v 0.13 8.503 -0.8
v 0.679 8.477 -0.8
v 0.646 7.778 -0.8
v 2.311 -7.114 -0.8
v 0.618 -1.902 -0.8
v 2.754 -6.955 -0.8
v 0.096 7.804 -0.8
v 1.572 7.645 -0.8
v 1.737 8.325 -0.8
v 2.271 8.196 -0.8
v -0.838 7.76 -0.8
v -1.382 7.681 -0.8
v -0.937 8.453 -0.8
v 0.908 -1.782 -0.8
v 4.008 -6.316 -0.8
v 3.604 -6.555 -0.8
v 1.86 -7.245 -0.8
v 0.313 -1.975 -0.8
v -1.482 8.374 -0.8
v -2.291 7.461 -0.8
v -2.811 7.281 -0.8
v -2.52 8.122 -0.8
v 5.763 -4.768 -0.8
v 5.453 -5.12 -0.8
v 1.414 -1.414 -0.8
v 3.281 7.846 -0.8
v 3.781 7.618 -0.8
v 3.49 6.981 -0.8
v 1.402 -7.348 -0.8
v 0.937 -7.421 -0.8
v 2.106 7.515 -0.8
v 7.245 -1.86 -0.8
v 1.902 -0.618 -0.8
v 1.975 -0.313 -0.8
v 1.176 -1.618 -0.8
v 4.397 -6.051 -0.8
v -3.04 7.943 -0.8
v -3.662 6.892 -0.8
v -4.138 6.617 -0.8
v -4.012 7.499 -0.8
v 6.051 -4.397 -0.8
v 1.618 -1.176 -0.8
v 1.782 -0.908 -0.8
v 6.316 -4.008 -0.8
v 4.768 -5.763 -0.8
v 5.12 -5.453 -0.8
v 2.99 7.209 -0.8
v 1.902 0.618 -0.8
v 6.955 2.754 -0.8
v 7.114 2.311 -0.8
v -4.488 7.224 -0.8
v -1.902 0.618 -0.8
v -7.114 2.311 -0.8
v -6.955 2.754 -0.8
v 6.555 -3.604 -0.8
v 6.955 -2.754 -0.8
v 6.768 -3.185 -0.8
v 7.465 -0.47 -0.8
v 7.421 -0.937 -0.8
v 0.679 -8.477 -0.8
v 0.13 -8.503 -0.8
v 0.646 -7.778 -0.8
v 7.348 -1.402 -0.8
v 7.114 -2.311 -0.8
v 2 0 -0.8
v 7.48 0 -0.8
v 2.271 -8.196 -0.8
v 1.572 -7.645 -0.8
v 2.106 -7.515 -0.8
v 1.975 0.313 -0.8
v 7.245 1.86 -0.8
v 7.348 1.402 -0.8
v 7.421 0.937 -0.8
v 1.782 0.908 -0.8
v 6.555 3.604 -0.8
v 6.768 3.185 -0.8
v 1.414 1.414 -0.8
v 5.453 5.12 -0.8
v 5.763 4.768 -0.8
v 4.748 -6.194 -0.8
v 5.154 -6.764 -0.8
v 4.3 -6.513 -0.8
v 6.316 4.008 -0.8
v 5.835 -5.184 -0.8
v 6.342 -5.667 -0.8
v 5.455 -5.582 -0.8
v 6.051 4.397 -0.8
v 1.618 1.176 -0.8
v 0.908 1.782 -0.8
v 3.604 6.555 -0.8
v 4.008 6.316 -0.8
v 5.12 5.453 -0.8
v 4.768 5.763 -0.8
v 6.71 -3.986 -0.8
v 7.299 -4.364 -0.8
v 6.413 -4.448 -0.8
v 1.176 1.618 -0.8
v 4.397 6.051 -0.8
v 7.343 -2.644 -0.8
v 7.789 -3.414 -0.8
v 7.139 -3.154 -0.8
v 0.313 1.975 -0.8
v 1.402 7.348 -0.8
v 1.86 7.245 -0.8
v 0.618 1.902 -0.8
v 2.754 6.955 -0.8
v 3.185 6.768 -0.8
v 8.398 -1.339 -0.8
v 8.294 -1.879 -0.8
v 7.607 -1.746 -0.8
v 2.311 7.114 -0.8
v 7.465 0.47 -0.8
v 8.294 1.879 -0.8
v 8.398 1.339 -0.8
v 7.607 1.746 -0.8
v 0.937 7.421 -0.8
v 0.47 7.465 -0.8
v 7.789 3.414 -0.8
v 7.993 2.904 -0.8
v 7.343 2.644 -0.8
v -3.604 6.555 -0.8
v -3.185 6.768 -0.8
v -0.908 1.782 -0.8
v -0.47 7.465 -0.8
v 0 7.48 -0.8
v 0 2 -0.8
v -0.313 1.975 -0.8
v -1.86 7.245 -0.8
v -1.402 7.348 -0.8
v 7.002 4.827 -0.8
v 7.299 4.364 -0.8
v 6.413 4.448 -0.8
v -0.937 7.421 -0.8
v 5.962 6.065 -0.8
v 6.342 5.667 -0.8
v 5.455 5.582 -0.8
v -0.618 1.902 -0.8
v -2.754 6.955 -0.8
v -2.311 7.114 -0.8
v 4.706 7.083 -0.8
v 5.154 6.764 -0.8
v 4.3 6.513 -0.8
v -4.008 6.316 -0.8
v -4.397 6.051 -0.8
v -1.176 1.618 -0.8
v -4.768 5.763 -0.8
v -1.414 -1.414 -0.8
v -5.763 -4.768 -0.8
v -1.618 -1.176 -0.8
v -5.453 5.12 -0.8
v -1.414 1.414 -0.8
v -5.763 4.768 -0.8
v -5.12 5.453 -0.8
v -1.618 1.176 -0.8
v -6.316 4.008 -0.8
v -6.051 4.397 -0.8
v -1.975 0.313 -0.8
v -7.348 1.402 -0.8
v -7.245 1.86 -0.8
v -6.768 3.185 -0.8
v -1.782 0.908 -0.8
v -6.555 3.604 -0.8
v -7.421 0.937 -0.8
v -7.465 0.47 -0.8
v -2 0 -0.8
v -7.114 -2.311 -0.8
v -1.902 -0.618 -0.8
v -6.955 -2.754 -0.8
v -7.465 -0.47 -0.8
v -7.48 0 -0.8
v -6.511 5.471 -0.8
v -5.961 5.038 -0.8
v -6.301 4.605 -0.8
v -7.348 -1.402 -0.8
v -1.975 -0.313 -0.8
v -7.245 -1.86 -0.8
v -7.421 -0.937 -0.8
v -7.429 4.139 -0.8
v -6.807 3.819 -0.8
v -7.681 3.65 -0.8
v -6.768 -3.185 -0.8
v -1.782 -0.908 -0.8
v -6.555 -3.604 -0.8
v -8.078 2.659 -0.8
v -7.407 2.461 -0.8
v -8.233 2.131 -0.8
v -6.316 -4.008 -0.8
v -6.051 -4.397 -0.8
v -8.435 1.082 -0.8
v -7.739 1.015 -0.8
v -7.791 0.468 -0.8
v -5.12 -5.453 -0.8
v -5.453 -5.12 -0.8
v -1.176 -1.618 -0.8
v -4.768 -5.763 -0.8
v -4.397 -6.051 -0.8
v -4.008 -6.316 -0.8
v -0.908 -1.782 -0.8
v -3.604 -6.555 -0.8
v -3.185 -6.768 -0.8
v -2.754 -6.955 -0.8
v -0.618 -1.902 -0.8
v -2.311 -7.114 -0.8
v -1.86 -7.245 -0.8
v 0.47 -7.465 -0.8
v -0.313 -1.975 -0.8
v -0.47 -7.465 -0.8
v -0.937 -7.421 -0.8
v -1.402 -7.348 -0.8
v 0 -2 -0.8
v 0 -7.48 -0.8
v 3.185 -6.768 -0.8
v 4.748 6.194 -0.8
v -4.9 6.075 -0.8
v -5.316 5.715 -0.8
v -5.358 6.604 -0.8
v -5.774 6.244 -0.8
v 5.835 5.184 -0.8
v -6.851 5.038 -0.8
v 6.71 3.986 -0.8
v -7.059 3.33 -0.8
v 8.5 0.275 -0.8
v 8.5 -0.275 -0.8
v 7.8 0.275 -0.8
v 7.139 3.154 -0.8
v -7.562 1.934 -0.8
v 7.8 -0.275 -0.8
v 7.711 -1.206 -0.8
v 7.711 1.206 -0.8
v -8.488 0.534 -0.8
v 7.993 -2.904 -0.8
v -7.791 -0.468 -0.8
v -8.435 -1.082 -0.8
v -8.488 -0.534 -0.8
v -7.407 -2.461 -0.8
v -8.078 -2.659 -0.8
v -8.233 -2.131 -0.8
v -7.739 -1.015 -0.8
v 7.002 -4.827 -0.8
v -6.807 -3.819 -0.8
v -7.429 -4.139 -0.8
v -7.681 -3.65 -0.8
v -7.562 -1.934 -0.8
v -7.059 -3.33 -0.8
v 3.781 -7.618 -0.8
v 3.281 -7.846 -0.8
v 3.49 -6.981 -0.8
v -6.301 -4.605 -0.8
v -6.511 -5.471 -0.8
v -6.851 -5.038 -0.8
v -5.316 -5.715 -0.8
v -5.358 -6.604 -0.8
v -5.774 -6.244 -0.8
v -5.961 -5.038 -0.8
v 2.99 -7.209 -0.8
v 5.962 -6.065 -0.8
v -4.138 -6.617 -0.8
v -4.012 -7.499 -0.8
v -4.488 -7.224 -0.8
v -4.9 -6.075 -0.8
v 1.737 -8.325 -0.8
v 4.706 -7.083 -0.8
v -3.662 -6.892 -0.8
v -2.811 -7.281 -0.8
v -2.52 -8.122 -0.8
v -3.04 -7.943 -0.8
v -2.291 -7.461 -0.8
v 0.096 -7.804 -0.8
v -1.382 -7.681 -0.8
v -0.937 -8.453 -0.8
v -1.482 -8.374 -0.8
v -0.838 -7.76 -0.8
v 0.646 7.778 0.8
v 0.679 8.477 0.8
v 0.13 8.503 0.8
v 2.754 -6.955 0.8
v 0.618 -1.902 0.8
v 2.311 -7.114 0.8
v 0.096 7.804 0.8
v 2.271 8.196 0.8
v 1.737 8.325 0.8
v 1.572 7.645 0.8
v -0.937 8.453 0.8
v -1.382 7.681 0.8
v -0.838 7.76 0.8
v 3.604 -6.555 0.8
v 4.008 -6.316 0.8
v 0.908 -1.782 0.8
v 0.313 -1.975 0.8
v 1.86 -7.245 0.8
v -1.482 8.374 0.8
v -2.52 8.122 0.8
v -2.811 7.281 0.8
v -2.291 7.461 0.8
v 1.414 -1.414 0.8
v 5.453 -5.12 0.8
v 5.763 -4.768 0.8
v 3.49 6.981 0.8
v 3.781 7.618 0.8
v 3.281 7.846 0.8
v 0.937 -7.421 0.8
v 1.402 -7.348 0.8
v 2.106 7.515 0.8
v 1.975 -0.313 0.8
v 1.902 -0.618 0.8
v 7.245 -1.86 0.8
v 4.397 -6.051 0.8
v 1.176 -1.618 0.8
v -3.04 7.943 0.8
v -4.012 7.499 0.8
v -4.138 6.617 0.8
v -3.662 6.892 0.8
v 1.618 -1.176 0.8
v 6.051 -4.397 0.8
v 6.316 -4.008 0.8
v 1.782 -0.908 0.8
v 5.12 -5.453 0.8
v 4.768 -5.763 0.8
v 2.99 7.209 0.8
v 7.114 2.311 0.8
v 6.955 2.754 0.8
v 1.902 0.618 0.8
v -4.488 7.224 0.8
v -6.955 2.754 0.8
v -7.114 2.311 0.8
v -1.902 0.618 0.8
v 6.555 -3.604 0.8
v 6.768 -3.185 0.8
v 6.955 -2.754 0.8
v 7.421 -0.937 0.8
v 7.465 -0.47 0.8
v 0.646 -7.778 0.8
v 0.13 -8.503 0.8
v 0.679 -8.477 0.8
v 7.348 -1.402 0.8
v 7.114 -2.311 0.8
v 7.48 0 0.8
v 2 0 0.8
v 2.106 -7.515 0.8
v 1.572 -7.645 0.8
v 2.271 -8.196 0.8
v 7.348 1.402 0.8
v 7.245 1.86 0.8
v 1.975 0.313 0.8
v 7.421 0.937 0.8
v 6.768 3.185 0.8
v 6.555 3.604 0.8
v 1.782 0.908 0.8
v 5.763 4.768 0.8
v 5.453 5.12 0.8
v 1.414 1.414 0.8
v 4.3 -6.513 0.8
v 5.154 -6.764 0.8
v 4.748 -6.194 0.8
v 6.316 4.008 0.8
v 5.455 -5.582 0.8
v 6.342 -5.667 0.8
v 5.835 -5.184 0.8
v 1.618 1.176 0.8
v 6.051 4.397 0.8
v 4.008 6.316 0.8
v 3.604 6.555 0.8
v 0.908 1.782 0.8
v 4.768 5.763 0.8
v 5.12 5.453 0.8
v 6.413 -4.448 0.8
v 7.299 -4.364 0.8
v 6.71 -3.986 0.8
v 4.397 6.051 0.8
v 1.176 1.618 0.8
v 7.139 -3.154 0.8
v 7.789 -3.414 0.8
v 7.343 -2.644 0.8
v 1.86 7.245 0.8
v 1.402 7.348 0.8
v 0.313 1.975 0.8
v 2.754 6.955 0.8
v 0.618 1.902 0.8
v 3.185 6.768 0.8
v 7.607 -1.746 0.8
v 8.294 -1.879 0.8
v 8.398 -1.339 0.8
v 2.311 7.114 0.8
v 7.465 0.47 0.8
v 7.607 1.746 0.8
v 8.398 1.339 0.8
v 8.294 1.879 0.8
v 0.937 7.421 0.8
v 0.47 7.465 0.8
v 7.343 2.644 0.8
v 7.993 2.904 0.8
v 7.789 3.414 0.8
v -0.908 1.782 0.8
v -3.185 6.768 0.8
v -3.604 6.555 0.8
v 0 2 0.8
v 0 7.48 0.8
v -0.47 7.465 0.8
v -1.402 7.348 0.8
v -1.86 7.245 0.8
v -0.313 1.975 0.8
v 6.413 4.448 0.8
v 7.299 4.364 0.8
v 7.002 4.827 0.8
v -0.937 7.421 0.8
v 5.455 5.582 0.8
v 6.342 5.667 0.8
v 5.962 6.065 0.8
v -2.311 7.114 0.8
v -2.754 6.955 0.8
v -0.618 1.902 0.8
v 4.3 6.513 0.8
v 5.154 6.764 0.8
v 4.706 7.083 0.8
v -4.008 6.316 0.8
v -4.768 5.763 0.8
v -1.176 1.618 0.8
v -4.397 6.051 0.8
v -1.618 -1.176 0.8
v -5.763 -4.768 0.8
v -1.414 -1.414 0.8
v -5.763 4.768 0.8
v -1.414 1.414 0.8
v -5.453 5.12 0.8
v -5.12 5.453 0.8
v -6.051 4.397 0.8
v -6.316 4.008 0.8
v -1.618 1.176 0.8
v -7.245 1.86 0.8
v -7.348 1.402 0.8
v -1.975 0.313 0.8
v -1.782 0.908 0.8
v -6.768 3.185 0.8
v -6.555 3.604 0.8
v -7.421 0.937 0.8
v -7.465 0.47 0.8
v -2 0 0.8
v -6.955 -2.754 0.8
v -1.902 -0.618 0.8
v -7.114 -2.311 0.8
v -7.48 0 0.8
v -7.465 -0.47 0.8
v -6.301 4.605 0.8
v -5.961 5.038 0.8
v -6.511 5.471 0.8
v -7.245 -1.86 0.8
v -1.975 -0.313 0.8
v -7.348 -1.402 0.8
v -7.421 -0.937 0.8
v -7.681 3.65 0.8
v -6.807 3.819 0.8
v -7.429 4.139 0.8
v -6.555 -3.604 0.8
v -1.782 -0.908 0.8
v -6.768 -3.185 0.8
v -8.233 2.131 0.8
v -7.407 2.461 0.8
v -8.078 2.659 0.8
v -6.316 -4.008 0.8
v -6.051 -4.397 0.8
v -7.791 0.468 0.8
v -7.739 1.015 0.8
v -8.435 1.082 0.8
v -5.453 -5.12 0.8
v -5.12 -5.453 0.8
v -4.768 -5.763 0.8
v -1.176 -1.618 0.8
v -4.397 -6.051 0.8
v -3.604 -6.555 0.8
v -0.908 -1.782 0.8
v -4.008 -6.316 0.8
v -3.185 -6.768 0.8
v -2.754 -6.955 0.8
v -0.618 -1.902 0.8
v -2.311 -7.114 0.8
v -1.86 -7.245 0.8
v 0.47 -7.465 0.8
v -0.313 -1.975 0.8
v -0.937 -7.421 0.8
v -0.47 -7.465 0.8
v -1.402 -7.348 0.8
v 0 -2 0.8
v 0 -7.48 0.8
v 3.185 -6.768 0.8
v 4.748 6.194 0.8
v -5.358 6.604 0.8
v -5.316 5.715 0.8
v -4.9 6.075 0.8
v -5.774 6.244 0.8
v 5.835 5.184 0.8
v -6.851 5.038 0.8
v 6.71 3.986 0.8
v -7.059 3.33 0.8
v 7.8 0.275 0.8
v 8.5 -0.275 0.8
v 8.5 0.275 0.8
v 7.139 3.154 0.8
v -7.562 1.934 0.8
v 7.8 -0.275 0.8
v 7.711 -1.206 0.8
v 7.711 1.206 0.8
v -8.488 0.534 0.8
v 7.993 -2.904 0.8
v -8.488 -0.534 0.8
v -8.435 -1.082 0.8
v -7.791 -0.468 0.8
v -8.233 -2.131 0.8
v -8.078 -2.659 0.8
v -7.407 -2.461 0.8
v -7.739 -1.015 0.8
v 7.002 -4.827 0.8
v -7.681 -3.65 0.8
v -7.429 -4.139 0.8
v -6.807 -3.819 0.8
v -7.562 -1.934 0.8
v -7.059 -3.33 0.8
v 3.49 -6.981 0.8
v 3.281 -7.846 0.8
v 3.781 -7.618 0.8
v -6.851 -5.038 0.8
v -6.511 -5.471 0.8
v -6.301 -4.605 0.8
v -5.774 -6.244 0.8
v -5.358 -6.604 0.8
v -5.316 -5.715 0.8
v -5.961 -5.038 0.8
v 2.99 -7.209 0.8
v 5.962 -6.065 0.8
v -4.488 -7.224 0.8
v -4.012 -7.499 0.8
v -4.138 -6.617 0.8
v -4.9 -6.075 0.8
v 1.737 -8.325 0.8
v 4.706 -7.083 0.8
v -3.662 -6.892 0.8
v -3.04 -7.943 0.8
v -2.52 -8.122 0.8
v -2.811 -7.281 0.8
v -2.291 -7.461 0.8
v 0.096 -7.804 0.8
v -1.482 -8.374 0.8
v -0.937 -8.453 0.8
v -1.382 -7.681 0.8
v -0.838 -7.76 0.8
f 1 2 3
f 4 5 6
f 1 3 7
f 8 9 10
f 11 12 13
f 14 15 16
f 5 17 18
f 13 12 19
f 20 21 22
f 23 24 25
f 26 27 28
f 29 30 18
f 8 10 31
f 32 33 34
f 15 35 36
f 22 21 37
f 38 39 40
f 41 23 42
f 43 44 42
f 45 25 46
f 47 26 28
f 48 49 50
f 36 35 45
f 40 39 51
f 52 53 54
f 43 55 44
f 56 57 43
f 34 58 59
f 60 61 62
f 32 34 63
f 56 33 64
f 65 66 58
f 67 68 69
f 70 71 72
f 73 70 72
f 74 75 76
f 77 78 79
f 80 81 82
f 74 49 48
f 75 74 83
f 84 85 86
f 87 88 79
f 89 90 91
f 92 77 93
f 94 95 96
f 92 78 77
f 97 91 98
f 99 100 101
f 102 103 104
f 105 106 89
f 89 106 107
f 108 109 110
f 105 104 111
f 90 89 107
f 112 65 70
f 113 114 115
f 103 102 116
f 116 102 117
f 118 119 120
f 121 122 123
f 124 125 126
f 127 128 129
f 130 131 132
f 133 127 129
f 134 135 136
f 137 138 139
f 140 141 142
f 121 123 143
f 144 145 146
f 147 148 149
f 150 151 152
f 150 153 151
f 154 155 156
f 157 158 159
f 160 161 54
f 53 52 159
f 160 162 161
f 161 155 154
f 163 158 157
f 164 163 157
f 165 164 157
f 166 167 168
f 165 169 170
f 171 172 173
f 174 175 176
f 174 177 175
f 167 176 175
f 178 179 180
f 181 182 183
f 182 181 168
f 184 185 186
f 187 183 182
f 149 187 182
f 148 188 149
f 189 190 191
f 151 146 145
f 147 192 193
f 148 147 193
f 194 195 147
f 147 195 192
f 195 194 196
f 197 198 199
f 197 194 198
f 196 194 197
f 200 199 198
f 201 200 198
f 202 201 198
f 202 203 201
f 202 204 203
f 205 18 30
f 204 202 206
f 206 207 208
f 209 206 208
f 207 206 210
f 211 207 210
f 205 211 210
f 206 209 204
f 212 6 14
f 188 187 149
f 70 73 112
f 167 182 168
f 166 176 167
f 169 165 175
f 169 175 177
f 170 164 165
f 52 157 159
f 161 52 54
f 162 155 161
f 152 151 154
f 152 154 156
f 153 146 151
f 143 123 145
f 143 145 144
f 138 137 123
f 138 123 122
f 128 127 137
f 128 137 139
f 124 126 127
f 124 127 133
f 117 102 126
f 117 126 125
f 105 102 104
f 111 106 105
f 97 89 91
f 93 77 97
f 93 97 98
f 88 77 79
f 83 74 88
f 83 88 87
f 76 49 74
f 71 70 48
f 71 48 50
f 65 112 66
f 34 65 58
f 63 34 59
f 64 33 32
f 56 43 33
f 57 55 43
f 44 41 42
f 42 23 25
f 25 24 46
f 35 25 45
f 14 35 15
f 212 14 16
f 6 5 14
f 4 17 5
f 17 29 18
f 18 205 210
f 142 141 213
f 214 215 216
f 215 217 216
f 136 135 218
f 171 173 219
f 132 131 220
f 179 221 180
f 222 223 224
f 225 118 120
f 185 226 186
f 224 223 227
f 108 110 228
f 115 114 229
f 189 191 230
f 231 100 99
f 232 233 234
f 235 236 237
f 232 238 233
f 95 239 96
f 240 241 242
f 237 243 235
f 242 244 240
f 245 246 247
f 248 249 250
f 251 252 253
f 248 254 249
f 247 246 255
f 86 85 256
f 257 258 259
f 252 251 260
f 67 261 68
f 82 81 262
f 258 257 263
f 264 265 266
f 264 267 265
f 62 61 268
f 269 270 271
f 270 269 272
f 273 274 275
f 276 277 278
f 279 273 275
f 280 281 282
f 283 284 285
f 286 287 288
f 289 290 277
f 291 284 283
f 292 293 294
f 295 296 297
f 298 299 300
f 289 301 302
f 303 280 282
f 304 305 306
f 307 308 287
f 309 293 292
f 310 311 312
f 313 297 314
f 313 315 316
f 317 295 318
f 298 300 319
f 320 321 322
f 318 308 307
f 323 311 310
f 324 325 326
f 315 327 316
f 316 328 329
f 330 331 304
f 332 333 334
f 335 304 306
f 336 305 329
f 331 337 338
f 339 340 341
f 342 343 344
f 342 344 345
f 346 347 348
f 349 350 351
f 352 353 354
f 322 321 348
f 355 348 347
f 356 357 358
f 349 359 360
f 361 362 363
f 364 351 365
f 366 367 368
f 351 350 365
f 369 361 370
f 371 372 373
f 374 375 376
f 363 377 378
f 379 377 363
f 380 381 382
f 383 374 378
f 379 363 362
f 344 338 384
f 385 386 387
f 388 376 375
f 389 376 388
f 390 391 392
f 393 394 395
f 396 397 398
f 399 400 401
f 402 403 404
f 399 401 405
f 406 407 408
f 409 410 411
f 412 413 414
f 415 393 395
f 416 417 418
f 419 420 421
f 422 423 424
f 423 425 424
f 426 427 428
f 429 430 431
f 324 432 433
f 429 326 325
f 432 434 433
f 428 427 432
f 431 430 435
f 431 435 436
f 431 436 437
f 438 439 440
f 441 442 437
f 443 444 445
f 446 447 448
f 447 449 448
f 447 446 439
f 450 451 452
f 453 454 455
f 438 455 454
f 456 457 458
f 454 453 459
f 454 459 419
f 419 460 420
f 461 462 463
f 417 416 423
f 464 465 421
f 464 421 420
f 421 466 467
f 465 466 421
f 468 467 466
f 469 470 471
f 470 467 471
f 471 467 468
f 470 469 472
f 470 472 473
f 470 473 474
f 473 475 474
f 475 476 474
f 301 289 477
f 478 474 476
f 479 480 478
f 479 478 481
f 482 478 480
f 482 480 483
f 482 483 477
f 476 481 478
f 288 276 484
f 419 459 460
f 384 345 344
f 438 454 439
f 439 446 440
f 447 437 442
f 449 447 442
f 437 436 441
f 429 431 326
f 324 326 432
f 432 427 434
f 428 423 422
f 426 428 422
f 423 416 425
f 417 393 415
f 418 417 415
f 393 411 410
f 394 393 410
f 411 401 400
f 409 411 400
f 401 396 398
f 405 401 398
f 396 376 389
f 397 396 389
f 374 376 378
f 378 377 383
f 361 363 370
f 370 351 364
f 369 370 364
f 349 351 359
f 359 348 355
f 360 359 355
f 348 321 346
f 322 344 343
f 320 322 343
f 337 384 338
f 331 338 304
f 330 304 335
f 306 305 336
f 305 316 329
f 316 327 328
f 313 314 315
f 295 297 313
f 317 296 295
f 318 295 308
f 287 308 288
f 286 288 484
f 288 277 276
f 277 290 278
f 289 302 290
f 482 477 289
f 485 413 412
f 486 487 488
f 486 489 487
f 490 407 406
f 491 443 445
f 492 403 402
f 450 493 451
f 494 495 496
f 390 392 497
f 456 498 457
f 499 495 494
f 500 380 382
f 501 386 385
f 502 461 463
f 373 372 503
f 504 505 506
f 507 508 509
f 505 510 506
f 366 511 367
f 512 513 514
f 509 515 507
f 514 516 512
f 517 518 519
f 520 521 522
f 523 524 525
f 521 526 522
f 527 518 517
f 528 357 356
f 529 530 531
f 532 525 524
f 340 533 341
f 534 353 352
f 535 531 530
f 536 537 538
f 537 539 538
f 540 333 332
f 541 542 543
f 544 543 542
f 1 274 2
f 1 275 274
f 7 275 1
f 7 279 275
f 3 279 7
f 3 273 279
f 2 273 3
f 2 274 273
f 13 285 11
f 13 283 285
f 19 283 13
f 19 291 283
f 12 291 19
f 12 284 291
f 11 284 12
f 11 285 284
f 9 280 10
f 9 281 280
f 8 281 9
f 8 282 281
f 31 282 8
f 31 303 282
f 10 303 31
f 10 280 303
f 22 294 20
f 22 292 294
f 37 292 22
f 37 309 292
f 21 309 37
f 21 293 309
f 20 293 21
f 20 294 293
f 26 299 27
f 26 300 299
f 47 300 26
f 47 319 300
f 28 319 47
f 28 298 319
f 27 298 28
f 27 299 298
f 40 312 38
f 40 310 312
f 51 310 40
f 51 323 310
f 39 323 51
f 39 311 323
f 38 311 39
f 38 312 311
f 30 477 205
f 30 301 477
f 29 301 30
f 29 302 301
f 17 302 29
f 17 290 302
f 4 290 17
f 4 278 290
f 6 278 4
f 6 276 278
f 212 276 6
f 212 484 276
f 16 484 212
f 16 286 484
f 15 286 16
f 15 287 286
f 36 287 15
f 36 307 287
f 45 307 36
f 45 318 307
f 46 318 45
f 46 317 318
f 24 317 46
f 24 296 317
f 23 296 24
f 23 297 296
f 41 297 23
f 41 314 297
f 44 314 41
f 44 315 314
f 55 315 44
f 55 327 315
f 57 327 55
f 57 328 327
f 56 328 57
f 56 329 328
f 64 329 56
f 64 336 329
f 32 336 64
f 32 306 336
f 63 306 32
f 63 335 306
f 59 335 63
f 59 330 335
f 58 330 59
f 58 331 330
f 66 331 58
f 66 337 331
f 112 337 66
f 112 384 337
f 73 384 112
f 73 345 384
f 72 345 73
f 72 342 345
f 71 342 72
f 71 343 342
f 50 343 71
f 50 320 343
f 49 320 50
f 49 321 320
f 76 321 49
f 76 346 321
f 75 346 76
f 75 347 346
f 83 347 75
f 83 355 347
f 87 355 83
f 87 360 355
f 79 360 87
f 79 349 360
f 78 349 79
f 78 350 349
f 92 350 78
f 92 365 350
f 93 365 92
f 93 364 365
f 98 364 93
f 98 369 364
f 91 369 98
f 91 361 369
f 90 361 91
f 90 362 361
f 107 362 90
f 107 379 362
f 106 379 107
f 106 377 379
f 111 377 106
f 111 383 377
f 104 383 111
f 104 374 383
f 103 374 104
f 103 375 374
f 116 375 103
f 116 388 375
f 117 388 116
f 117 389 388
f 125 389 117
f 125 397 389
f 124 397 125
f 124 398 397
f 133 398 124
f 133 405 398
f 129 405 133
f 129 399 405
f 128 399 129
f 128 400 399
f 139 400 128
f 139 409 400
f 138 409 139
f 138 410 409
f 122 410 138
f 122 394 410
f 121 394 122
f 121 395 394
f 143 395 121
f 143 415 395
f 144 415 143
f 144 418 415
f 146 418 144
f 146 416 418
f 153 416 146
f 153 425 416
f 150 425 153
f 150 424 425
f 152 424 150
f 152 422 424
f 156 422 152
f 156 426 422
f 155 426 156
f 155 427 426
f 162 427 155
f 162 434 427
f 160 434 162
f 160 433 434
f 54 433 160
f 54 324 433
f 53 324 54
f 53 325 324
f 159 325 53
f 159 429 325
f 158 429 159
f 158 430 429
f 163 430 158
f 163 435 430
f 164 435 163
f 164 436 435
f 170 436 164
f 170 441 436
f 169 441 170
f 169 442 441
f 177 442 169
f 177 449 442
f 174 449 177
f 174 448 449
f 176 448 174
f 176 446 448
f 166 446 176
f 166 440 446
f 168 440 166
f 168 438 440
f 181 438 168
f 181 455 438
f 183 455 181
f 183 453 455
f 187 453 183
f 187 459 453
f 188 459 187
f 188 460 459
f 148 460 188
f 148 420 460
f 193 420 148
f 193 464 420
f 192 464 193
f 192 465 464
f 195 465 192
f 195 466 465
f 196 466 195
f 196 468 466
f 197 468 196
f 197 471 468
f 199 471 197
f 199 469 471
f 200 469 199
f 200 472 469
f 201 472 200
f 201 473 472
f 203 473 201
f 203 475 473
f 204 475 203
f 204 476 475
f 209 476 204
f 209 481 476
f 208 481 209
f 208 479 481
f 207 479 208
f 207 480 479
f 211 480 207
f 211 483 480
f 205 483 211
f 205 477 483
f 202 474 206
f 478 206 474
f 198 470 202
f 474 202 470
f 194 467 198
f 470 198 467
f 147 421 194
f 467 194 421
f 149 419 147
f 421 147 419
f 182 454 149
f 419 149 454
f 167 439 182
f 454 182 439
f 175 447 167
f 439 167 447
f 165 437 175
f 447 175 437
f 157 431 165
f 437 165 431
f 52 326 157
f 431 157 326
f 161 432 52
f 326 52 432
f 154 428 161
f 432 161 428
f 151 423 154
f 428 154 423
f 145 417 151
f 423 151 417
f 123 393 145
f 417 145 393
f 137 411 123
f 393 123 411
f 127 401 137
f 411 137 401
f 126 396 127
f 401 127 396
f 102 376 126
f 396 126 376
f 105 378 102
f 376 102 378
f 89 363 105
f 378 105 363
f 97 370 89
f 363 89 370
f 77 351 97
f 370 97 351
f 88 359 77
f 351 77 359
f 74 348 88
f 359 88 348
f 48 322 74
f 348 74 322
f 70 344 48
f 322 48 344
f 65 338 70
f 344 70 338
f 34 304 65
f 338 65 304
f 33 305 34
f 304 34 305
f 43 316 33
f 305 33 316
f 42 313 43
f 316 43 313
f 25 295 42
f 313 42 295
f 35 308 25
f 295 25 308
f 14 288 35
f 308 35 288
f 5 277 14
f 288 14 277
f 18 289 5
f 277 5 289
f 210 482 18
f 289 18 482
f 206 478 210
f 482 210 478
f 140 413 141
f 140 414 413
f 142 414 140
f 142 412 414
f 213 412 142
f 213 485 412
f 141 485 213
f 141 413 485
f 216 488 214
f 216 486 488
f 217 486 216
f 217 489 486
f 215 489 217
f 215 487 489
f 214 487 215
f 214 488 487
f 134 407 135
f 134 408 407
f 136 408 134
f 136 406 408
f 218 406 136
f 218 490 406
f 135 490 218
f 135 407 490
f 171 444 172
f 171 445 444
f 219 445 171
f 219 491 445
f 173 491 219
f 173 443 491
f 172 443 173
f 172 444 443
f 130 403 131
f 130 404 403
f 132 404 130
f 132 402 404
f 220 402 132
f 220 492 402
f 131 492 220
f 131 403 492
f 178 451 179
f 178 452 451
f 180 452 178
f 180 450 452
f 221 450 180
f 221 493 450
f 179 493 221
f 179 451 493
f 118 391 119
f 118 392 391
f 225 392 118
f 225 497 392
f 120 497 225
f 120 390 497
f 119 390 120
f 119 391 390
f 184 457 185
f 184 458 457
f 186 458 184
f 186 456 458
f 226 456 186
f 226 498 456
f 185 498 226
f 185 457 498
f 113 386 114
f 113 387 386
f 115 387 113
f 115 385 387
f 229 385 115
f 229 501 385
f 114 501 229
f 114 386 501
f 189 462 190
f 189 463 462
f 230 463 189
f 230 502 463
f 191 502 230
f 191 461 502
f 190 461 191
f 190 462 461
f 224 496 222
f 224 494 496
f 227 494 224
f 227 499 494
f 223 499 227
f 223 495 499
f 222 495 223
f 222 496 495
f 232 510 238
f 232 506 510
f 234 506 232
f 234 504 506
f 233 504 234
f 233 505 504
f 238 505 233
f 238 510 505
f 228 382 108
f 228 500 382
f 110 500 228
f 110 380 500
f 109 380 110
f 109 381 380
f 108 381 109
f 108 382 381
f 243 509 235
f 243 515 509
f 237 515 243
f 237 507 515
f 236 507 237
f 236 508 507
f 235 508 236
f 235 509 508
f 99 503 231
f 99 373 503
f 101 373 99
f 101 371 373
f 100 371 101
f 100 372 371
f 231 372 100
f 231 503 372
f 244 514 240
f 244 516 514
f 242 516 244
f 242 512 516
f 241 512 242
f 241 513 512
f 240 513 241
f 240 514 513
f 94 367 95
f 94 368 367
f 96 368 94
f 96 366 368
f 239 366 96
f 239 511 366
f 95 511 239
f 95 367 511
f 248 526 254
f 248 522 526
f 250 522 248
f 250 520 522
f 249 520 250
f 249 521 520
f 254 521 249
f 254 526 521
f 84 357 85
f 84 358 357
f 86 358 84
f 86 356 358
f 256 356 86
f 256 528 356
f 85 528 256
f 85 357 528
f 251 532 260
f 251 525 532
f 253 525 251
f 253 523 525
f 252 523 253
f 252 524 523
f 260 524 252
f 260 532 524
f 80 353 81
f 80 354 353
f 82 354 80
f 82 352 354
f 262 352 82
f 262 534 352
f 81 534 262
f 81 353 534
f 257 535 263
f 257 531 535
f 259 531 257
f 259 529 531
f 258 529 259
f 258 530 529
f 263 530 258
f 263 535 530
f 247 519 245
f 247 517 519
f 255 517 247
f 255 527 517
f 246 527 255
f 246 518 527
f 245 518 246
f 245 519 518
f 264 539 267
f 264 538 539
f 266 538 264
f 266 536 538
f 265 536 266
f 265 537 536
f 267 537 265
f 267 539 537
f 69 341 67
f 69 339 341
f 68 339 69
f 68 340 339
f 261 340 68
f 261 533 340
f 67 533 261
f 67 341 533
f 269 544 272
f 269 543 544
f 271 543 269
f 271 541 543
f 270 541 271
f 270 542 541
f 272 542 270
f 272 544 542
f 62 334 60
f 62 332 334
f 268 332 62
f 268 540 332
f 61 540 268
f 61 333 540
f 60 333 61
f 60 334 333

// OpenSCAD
// part_id: b3
// name: B3 companion gear
// source_drawing_ids: DRW-002
// units: mm
// revision: 0.1
// SPDX-License-Identifier: MIT

module b3_gear_2d(outer_d = 17.2, root_d = 14.96, tooth_count = 33, bore_d = 4.0) {
    difference() {
        union() {
            circle(d = root_d, $fn = 100);
            for (i = [0 : tooth_count - 1])
                rotate(i * 360 / tooth_count)
                    translate([outer_d / 2 - 0.45, 0])
                        square([0.70, 0.55], center = true);
        }
        circle(d = bore_d, $fn = 40);
    }
}

module part_b3(thickness = 1.6) {
    translate([0, 0, -thickness / 2])
        linear_extrude(height = thickness)
            b3_gear_2d();
}

// ---- "main guard" ----
// Default to previewing when opened directly:
if (is_undef(__LIB_MODE__)) {
    part_b3();
}
